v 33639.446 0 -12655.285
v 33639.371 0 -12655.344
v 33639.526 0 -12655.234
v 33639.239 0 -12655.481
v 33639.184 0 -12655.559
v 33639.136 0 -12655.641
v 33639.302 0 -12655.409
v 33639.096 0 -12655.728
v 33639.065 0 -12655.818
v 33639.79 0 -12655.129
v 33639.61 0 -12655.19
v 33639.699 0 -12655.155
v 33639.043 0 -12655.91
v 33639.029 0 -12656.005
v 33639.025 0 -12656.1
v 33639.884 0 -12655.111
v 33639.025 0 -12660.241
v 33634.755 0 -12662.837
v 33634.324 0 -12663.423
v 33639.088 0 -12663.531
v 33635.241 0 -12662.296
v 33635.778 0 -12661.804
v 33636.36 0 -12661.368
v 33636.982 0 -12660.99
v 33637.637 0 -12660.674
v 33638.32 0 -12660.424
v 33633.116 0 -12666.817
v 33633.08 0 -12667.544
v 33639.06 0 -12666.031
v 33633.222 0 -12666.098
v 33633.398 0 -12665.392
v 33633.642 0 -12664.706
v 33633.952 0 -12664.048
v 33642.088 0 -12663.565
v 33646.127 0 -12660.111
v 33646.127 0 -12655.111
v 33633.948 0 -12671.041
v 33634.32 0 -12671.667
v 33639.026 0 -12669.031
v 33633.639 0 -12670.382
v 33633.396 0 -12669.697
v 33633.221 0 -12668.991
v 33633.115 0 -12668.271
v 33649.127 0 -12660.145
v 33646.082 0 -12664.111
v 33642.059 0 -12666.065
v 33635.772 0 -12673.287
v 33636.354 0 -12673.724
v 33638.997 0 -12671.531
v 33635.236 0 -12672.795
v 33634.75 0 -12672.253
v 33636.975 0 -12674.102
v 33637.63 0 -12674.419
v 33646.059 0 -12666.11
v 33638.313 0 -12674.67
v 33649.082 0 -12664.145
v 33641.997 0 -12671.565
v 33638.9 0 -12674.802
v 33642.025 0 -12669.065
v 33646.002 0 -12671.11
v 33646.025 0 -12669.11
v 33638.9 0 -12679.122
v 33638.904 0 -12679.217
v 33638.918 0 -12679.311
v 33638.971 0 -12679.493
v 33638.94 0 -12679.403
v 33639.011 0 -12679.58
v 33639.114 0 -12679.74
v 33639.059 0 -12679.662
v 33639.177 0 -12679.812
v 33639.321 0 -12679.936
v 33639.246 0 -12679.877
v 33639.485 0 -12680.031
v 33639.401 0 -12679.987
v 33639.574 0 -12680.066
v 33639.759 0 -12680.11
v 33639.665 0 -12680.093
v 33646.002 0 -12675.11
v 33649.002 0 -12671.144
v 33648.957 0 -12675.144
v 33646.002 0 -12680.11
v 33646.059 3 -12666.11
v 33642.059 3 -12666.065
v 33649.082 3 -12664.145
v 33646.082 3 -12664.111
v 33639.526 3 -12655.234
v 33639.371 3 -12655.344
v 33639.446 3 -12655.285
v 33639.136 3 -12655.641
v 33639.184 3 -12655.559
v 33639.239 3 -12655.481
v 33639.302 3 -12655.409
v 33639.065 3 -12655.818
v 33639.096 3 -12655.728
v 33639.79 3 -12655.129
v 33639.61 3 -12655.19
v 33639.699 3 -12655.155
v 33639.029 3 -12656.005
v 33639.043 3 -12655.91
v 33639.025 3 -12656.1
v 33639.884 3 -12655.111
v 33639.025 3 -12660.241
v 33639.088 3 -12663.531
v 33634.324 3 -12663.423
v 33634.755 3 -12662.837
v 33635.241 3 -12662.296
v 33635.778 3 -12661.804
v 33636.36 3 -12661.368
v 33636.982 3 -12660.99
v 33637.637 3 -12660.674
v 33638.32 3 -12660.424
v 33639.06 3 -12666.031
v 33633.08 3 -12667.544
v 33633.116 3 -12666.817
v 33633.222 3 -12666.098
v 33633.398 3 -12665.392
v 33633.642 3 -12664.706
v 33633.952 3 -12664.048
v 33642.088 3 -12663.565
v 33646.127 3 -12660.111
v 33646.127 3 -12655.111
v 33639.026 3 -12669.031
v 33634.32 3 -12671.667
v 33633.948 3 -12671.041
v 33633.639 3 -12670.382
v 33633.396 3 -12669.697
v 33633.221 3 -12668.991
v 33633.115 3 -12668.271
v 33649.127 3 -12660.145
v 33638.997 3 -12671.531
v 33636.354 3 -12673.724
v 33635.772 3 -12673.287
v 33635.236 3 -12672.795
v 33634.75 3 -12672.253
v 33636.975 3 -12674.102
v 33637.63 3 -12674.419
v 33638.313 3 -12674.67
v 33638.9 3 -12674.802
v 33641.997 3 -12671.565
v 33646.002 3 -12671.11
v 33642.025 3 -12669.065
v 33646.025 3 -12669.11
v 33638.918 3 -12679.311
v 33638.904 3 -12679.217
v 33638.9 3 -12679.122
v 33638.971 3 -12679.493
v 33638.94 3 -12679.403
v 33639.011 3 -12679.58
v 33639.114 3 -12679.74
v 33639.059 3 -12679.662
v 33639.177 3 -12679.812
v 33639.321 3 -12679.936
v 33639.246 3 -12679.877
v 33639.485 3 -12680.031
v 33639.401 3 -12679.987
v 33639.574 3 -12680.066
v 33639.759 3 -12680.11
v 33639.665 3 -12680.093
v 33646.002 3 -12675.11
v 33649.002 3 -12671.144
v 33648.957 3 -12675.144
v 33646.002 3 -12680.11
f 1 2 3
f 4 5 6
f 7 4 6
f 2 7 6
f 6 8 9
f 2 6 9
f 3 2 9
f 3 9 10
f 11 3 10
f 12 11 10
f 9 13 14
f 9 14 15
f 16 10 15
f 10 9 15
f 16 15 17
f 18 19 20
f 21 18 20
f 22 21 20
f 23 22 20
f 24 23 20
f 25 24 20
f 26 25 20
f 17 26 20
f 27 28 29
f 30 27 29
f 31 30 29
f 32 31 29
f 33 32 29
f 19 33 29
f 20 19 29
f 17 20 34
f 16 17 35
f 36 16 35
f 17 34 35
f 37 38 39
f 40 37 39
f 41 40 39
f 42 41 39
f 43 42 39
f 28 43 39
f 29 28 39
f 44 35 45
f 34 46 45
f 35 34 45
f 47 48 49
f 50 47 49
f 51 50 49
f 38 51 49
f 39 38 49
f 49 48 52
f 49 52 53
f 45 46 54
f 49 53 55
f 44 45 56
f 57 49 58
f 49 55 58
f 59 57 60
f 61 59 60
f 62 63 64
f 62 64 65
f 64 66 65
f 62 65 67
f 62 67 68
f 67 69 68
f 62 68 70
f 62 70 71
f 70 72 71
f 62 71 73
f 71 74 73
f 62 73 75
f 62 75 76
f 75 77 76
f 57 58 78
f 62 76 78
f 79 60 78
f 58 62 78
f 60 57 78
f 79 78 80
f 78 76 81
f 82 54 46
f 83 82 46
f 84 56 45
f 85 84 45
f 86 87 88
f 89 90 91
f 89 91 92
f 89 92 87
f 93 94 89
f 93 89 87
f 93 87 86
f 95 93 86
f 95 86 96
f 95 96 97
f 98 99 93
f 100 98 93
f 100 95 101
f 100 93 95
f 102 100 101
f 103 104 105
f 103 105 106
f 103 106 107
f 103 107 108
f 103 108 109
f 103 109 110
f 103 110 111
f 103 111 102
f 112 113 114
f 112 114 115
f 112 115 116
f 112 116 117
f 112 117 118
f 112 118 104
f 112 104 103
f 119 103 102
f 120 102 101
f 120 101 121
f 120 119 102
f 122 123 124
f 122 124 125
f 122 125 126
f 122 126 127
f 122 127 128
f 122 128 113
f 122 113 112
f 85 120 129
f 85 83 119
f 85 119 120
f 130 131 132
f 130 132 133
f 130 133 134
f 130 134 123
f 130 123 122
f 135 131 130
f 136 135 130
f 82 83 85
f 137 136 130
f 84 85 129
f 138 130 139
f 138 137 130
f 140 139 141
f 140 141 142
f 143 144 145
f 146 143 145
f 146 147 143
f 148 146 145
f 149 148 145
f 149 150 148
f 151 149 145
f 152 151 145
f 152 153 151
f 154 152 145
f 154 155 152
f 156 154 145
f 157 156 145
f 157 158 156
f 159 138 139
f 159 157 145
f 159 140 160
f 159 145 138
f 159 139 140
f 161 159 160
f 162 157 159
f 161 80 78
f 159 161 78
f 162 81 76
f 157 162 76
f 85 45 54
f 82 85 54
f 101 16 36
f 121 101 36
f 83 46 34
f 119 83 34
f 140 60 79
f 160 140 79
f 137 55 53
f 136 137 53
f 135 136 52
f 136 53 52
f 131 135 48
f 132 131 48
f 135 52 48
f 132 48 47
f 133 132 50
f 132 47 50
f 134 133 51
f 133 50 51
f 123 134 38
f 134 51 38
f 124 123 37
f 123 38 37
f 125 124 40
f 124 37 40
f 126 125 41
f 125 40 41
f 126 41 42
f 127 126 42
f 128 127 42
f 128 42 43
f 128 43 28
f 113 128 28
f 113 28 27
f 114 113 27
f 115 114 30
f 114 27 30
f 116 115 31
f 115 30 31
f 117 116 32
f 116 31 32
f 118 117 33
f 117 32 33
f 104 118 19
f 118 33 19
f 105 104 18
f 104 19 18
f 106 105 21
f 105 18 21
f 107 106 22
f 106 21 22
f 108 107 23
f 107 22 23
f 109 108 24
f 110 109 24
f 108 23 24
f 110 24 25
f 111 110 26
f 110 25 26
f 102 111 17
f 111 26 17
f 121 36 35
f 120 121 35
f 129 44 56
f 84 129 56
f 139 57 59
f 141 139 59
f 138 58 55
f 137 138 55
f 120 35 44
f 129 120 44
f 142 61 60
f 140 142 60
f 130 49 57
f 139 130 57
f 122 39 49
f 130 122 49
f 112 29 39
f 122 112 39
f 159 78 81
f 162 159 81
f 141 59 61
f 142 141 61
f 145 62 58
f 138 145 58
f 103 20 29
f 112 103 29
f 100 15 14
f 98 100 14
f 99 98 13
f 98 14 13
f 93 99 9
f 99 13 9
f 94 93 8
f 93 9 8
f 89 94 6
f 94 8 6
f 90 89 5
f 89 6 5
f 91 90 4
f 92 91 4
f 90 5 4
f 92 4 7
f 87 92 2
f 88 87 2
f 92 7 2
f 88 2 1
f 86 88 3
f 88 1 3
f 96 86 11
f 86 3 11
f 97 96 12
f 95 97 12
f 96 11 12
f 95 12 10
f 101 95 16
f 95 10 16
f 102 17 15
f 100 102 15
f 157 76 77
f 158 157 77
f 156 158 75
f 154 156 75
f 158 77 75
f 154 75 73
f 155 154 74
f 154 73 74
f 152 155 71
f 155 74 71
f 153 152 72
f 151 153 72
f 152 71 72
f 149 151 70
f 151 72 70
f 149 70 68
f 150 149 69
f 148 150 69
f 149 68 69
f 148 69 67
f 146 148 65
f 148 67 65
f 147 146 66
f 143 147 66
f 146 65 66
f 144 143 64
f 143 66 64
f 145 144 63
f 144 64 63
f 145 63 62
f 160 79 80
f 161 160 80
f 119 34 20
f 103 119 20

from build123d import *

# Parameters (mm, degrees)
SALIENTE_EXTRUIR1_DEPTH = 3


with BuildPart() as part:
    # Croquis1 → Saliente-Extruir1 (new body)
    with BuildSketch(Plane(origin=(0, 0, 0), x_dir=(1, 0, 0), z_dir=(0, 1, 0))):
        with BuildLine():
            Line((33638.899606001, 12674.802256187), (33638.31321683, 12674.669512098))
            ThreePointArc((33638.31321683, 12674.669512098), (33633.089099042, 12667.180361564), (33639.024595085, 12660.24143736))
            Line((33639.024595085, 12660.24143736), (33639.024595085, 12656.099650441))
            ThreePointArc((33639.024595085, 12656.099650441), (33639.269455485, 12655.444618543), (33639.883952447, 12655.11082686))
            Line((33639.883952447, 12655.11082686), (33646.127320324, 12655.11082686))
            Line((33646.127320324, 12655.11082686), (33646.127126628, 12660.11082686))
            Line((33646.127126628, 12660.11082686), (33649.127126628, 12660.144916986))
            Line((33649.127126628, 12660.144916986), (33649.081676061, 12664.144658758))
            Line((33649.081676061, 12664.144658758), (33646.081869732, 12664.110570833))
            Line((33646.081869732, 12664.110570833), (33646.059144449, 12666.11044172))
            Line((33646.059144449, 12666.11044172), (33642.059402676, 12666.064991153))
            Line((33642.059402676, 12666.064991153), (33642.087809281, 12663.565152545))
            Line((33642.087809281, 12663.565152545), (33639.088002951, 12663.53106462))
            Line((33639.088002951, 12663.53106462), (33639.059596347, 12666.030903228))
            Line((33639.059596347, 12666.030903228), (33639.025508422, 12669.030709557))
            Line((33639.025508422, 12669.030709557), (33638.997101818, 12671.530548165))
            Line((33638.997101818, 12671.530548165), (33641.996908147, 12671.56463609))
            Line((33641.996908147, 12671.56463609), (33642.025314751, 12669.064797482))
            Line((33642.025314751, 12669.064797482), (33646.025056524, 12669.110248049))
            Line((33646.025056524, 12669.110248049), (33646.00233124, 12671.110118935))
            Line((33646.00233124, 12671.110118935), (33649.00213757, 12671.14420686))
            Line((33649.00213757, 12671.14420686), (33648.956687003, 12675.143948633))
            Line((33648.956687003, 12675.143948633), (33646.00233124, 12675.110377179))
            Line((33646.00233124, 12675.110377179), (33646.00233124, 12680.110377179))
            Line((33646.00233124, 12680.110377179), (33639.758963363, 12680.110377179))
            ThreePointArc((33639.758963363, 12680.110377179), (33639.144466402, 12679.776585497), (33638.899606001, 12679.121553599))
            Line((33638.899606001, 12679.121553599), (33638.899606001, 12674.802256187))
        make_face()
    extrude(amount=SALIENTE_EXTRUIR1_DEPTH)


solid = part.part
